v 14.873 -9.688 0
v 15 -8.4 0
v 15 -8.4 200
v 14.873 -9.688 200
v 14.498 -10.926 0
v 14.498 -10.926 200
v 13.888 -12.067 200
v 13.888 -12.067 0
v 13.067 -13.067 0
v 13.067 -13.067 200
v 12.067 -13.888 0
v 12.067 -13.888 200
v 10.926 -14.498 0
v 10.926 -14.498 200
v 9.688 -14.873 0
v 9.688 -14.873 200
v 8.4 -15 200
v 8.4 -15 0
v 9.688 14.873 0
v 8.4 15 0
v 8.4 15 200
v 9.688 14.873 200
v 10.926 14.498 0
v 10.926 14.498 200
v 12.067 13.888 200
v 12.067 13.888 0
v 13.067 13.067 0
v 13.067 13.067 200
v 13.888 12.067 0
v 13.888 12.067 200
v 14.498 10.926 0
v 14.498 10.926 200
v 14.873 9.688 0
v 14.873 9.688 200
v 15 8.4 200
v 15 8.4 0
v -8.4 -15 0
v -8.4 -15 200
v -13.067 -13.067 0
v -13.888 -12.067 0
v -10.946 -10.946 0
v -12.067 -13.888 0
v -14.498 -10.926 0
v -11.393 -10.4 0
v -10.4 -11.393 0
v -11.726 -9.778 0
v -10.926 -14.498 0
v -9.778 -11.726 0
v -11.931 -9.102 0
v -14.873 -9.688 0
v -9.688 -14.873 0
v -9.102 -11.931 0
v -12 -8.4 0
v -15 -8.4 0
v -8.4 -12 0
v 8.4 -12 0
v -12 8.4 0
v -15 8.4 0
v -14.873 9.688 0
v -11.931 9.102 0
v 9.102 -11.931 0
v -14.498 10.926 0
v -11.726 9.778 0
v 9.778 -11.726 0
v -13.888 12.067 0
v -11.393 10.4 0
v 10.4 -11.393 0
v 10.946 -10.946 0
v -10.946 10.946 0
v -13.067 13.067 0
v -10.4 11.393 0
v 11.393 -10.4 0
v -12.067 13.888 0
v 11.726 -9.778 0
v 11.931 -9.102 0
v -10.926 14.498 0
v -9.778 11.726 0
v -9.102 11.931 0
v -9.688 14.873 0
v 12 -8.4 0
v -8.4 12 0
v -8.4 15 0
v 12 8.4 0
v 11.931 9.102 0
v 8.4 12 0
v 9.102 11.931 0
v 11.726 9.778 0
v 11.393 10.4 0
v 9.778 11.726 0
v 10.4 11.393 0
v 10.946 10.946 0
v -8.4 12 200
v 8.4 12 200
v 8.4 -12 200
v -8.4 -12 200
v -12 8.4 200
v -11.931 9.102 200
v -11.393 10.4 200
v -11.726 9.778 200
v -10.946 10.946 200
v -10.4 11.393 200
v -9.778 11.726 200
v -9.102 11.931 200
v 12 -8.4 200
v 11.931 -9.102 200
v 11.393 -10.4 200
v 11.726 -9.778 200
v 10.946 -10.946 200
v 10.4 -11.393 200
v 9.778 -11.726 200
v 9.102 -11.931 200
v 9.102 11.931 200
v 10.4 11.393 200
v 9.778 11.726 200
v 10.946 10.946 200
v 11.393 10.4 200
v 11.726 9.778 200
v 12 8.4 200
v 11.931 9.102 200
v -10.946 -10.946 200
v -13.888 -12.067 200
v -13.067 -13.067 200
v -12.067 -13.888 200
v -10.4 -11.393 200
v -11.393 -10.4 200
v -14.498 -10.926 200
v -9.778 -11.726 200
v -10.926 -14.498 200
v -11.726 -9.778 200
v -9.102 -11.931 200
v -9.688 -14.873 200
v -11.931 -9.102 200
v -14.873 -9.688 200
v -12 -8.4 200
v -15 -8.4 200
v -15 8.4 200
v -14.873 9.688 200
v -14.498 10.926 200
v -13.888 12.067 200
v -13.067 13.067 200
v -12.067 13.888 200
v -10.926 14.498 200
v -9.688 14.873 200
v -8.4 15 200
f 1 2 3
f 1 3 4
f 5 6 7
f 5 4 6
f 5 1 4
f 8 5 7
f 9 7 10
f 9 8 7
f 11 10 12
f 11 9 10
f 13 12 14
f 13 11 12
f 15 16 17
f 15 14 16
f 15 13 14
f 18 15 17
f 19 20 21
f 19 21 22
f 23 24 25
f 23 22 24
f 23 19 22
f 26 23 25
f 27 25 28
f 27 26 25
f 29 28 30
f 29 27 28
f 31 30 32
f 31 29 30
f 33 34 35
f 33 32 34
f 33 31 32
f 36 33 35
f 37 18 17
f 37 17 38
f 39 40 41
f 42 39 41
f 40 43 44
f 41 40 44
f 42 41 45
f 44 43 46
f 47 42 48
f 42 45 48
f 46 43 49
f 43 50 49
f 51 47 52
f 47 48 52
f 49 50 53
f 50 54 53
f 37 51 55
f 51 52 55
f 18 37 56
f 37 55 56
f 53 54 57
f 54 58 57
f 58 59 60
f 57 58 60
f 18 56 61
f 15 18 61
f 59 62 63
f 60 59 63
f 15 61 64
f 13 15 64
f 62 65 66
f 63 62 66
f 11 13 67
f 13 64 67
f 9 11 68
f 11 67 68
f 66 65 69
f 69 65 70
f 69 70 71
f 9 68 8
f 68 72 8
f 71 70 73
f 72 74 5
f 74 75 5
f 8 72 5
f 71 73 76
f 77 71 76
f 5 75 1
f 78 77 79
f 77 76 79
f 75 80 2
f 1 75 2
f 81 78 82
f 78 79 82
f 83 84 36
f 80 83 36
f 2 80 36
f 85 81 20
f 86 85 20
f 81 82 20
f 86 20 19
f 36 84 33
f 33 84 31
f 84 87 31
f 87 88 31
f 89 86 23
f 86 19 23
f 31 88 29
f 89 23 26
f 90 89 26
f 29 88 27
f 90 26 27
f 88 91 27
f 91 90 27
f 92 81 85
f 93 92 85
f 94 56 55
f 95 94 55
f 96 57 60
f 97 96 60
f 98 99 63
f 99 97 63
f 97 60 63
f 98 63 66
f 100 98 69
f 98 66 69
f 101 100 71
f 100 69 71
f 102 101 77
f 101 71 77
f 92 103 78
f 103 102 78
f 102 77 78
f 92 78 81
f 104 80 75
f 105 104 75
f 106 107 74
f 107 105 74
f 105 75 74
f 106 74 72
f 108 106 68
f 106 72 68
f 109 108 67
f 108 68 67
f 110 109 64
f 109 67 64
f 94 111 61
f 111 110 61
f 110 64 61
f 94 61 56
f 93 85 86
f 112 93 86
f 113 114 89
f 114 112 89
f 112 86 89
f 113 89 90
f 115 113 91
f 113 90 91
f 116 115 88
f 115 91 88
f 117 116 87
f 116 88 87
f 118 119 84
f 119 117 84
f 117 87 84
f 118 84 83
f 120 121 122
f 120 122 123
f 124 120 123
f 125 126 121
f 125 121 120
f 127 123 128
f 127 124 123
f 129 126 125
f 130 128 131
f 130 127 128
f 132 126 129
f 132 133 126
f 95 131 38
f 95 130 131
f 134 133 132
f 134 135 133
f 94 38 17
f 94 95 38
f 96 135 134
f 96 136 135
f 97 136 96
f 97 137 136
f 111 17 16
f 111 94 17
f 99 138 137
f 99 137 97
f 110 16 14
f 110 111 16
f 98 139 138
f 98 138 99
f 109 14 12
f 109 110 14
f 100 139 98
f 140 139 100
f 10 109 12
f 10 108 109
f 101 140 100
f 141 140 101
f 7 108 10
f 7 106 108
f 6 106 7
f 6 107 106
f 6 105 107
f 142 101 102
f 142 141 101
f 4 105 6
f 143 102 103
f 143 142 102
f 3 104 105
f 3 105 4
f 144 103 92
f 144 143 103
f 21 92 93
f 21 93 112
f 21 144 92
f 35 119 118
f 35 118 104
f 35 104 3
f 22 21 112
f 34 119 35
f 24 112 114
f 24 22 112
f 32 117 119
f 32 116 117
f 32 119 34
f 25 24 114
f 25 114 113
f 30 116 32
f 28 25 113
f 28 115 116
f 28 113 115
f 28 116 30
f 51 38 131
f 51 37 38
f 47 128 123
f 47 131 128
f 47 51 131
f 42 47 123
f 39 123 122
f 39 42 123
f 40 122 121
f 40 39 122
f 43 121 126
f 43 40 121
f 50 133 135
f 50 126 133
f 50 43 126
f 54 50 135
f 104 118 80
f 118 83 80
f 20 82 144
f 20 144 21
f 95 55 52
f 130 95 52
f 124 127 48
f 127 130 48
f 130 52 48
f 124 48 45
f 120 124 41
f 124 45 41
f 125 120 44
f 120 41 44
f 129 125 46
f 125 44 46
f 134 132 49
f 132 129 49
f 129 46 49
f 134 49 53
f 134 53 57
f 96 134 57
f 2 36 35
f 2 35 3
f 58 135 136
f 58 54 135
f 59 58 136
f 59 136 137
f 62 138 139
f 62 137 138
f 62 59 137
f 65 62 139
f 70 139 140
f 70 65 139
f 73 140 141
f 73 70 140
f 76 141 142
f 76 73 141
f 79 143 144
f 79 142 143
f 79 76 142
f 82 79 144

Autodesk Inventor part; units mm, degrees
ref_plane "YZ Plane" through (0, 0, 0) normal (1, 0, 0) x (0, 1, 0)
ref_plane "Plano inicial" through (0, 0, 0) normal (0, 0, 1) x (1, 0, 0)
ref_plane "Plano final" through (0, 0, 550) normal (0, 0, 1) x (1, 0, 0)
sketch "Rascunho" plane through (0, 0, 0) normal (0, 0, 1) x (1, 0, 0)
  line L0 (-15, -8.4) -> (-15, 8.4)
  line L1 (-8.4, 15) -> (8.4, 15)
  line L2 (15, 8.4) -> (15, -8.4)
  line L3 (8.4, -15) -> (-8.4, -15)
  arc A0 (-15, -8.4) -> (-8.4, -15) centre (-8.4, -8.4) ccw
  arc A1 (-8.4, 15) -> (-15, 8.4) centre (-8.4, 8.4) ccw
  arc A2 (15, 8.4) -> (8.4, 15) centre (8.4, 8.4) ccw
  arc A3 (8.4, -15) -> (15, -8.4) centre (8.4, -8.4) ccw
  arc A4 (-8.4, 12) -> (-12, 8.4) centre (-8.4, 8.4) ccw
  line L4 (-8.4, 12) -> (8.4, 12)
  arc A5 (12, 8.4) -> (8.4, 12) centre (8.4, 8.4) ccw
  line L5 (12, 8.4) -> (12, -8.4)
  arc A6 (8.4, -12) -> (12, -8.4) centre (8.4, -8.4) ccw
  line L6 (8.4, -12) -> (-8.4, -12)
  arc A7 (-12, -8.4) -> (-8.4, -12) centre (-8.4, -8.4) ccw
  line L7 (-12, -8.4) -> (-12, 8.4)
  line L8 (0, 22.9137) -> (0, -22.9137) construction
  line L9 (-22.9137, 0) -> (22.9137, 0) construction
  dimension "d7" = 6.6
  dimension "d10" = 30
  dimension "d11" = 30
  dimension "d12" = 3
  dimension "d15" = 15
  dimension "d16" = 15
extrude "Corpo" add sketch "Rascunho" along normal blind 200 from surface at 0
sketch "Sketch3" plane through (0, 0, 0) normal (0, 0, 1) x (1, 0, 0)
  line L0 (0, 0) -> (10, 0)
ref_plane "Work Plane3" through (0, 0, 0) normal (0, -1, 0) x (1, 0, 0)
sketch "Sketch4" plane through (0, 0, 0) normal (0, -1, 0) x (1, 0, 0)
  line L0 (-2, 0) -> (12, 0) projected
  line L1 (-2, 550) -> (12, 550) projected
  dimension "d18" = 550
equation "\"d7\" = G_IR"
equation "\"d10\" = G_H"
equation "\"d11\" = G_W"
equation "\"d12\" = G_T"
equation "\"d15\" = 0.5 * d10"
equation "\"d16\" = 0.5 * d11"
equation "\"G_W\" = 30"
equation "\"G_H\" = 30"
equation "\"G_T\" = 3"
equation "\"G_IR\" = 6.6"
equation "\"G_L\" = d18"
equation "\"G_OFFSET_START\" = 0"
equation "\"G_OFFSET_END\" = 0"
properties part number "tubo extensão menor" material "Aço, suave"
